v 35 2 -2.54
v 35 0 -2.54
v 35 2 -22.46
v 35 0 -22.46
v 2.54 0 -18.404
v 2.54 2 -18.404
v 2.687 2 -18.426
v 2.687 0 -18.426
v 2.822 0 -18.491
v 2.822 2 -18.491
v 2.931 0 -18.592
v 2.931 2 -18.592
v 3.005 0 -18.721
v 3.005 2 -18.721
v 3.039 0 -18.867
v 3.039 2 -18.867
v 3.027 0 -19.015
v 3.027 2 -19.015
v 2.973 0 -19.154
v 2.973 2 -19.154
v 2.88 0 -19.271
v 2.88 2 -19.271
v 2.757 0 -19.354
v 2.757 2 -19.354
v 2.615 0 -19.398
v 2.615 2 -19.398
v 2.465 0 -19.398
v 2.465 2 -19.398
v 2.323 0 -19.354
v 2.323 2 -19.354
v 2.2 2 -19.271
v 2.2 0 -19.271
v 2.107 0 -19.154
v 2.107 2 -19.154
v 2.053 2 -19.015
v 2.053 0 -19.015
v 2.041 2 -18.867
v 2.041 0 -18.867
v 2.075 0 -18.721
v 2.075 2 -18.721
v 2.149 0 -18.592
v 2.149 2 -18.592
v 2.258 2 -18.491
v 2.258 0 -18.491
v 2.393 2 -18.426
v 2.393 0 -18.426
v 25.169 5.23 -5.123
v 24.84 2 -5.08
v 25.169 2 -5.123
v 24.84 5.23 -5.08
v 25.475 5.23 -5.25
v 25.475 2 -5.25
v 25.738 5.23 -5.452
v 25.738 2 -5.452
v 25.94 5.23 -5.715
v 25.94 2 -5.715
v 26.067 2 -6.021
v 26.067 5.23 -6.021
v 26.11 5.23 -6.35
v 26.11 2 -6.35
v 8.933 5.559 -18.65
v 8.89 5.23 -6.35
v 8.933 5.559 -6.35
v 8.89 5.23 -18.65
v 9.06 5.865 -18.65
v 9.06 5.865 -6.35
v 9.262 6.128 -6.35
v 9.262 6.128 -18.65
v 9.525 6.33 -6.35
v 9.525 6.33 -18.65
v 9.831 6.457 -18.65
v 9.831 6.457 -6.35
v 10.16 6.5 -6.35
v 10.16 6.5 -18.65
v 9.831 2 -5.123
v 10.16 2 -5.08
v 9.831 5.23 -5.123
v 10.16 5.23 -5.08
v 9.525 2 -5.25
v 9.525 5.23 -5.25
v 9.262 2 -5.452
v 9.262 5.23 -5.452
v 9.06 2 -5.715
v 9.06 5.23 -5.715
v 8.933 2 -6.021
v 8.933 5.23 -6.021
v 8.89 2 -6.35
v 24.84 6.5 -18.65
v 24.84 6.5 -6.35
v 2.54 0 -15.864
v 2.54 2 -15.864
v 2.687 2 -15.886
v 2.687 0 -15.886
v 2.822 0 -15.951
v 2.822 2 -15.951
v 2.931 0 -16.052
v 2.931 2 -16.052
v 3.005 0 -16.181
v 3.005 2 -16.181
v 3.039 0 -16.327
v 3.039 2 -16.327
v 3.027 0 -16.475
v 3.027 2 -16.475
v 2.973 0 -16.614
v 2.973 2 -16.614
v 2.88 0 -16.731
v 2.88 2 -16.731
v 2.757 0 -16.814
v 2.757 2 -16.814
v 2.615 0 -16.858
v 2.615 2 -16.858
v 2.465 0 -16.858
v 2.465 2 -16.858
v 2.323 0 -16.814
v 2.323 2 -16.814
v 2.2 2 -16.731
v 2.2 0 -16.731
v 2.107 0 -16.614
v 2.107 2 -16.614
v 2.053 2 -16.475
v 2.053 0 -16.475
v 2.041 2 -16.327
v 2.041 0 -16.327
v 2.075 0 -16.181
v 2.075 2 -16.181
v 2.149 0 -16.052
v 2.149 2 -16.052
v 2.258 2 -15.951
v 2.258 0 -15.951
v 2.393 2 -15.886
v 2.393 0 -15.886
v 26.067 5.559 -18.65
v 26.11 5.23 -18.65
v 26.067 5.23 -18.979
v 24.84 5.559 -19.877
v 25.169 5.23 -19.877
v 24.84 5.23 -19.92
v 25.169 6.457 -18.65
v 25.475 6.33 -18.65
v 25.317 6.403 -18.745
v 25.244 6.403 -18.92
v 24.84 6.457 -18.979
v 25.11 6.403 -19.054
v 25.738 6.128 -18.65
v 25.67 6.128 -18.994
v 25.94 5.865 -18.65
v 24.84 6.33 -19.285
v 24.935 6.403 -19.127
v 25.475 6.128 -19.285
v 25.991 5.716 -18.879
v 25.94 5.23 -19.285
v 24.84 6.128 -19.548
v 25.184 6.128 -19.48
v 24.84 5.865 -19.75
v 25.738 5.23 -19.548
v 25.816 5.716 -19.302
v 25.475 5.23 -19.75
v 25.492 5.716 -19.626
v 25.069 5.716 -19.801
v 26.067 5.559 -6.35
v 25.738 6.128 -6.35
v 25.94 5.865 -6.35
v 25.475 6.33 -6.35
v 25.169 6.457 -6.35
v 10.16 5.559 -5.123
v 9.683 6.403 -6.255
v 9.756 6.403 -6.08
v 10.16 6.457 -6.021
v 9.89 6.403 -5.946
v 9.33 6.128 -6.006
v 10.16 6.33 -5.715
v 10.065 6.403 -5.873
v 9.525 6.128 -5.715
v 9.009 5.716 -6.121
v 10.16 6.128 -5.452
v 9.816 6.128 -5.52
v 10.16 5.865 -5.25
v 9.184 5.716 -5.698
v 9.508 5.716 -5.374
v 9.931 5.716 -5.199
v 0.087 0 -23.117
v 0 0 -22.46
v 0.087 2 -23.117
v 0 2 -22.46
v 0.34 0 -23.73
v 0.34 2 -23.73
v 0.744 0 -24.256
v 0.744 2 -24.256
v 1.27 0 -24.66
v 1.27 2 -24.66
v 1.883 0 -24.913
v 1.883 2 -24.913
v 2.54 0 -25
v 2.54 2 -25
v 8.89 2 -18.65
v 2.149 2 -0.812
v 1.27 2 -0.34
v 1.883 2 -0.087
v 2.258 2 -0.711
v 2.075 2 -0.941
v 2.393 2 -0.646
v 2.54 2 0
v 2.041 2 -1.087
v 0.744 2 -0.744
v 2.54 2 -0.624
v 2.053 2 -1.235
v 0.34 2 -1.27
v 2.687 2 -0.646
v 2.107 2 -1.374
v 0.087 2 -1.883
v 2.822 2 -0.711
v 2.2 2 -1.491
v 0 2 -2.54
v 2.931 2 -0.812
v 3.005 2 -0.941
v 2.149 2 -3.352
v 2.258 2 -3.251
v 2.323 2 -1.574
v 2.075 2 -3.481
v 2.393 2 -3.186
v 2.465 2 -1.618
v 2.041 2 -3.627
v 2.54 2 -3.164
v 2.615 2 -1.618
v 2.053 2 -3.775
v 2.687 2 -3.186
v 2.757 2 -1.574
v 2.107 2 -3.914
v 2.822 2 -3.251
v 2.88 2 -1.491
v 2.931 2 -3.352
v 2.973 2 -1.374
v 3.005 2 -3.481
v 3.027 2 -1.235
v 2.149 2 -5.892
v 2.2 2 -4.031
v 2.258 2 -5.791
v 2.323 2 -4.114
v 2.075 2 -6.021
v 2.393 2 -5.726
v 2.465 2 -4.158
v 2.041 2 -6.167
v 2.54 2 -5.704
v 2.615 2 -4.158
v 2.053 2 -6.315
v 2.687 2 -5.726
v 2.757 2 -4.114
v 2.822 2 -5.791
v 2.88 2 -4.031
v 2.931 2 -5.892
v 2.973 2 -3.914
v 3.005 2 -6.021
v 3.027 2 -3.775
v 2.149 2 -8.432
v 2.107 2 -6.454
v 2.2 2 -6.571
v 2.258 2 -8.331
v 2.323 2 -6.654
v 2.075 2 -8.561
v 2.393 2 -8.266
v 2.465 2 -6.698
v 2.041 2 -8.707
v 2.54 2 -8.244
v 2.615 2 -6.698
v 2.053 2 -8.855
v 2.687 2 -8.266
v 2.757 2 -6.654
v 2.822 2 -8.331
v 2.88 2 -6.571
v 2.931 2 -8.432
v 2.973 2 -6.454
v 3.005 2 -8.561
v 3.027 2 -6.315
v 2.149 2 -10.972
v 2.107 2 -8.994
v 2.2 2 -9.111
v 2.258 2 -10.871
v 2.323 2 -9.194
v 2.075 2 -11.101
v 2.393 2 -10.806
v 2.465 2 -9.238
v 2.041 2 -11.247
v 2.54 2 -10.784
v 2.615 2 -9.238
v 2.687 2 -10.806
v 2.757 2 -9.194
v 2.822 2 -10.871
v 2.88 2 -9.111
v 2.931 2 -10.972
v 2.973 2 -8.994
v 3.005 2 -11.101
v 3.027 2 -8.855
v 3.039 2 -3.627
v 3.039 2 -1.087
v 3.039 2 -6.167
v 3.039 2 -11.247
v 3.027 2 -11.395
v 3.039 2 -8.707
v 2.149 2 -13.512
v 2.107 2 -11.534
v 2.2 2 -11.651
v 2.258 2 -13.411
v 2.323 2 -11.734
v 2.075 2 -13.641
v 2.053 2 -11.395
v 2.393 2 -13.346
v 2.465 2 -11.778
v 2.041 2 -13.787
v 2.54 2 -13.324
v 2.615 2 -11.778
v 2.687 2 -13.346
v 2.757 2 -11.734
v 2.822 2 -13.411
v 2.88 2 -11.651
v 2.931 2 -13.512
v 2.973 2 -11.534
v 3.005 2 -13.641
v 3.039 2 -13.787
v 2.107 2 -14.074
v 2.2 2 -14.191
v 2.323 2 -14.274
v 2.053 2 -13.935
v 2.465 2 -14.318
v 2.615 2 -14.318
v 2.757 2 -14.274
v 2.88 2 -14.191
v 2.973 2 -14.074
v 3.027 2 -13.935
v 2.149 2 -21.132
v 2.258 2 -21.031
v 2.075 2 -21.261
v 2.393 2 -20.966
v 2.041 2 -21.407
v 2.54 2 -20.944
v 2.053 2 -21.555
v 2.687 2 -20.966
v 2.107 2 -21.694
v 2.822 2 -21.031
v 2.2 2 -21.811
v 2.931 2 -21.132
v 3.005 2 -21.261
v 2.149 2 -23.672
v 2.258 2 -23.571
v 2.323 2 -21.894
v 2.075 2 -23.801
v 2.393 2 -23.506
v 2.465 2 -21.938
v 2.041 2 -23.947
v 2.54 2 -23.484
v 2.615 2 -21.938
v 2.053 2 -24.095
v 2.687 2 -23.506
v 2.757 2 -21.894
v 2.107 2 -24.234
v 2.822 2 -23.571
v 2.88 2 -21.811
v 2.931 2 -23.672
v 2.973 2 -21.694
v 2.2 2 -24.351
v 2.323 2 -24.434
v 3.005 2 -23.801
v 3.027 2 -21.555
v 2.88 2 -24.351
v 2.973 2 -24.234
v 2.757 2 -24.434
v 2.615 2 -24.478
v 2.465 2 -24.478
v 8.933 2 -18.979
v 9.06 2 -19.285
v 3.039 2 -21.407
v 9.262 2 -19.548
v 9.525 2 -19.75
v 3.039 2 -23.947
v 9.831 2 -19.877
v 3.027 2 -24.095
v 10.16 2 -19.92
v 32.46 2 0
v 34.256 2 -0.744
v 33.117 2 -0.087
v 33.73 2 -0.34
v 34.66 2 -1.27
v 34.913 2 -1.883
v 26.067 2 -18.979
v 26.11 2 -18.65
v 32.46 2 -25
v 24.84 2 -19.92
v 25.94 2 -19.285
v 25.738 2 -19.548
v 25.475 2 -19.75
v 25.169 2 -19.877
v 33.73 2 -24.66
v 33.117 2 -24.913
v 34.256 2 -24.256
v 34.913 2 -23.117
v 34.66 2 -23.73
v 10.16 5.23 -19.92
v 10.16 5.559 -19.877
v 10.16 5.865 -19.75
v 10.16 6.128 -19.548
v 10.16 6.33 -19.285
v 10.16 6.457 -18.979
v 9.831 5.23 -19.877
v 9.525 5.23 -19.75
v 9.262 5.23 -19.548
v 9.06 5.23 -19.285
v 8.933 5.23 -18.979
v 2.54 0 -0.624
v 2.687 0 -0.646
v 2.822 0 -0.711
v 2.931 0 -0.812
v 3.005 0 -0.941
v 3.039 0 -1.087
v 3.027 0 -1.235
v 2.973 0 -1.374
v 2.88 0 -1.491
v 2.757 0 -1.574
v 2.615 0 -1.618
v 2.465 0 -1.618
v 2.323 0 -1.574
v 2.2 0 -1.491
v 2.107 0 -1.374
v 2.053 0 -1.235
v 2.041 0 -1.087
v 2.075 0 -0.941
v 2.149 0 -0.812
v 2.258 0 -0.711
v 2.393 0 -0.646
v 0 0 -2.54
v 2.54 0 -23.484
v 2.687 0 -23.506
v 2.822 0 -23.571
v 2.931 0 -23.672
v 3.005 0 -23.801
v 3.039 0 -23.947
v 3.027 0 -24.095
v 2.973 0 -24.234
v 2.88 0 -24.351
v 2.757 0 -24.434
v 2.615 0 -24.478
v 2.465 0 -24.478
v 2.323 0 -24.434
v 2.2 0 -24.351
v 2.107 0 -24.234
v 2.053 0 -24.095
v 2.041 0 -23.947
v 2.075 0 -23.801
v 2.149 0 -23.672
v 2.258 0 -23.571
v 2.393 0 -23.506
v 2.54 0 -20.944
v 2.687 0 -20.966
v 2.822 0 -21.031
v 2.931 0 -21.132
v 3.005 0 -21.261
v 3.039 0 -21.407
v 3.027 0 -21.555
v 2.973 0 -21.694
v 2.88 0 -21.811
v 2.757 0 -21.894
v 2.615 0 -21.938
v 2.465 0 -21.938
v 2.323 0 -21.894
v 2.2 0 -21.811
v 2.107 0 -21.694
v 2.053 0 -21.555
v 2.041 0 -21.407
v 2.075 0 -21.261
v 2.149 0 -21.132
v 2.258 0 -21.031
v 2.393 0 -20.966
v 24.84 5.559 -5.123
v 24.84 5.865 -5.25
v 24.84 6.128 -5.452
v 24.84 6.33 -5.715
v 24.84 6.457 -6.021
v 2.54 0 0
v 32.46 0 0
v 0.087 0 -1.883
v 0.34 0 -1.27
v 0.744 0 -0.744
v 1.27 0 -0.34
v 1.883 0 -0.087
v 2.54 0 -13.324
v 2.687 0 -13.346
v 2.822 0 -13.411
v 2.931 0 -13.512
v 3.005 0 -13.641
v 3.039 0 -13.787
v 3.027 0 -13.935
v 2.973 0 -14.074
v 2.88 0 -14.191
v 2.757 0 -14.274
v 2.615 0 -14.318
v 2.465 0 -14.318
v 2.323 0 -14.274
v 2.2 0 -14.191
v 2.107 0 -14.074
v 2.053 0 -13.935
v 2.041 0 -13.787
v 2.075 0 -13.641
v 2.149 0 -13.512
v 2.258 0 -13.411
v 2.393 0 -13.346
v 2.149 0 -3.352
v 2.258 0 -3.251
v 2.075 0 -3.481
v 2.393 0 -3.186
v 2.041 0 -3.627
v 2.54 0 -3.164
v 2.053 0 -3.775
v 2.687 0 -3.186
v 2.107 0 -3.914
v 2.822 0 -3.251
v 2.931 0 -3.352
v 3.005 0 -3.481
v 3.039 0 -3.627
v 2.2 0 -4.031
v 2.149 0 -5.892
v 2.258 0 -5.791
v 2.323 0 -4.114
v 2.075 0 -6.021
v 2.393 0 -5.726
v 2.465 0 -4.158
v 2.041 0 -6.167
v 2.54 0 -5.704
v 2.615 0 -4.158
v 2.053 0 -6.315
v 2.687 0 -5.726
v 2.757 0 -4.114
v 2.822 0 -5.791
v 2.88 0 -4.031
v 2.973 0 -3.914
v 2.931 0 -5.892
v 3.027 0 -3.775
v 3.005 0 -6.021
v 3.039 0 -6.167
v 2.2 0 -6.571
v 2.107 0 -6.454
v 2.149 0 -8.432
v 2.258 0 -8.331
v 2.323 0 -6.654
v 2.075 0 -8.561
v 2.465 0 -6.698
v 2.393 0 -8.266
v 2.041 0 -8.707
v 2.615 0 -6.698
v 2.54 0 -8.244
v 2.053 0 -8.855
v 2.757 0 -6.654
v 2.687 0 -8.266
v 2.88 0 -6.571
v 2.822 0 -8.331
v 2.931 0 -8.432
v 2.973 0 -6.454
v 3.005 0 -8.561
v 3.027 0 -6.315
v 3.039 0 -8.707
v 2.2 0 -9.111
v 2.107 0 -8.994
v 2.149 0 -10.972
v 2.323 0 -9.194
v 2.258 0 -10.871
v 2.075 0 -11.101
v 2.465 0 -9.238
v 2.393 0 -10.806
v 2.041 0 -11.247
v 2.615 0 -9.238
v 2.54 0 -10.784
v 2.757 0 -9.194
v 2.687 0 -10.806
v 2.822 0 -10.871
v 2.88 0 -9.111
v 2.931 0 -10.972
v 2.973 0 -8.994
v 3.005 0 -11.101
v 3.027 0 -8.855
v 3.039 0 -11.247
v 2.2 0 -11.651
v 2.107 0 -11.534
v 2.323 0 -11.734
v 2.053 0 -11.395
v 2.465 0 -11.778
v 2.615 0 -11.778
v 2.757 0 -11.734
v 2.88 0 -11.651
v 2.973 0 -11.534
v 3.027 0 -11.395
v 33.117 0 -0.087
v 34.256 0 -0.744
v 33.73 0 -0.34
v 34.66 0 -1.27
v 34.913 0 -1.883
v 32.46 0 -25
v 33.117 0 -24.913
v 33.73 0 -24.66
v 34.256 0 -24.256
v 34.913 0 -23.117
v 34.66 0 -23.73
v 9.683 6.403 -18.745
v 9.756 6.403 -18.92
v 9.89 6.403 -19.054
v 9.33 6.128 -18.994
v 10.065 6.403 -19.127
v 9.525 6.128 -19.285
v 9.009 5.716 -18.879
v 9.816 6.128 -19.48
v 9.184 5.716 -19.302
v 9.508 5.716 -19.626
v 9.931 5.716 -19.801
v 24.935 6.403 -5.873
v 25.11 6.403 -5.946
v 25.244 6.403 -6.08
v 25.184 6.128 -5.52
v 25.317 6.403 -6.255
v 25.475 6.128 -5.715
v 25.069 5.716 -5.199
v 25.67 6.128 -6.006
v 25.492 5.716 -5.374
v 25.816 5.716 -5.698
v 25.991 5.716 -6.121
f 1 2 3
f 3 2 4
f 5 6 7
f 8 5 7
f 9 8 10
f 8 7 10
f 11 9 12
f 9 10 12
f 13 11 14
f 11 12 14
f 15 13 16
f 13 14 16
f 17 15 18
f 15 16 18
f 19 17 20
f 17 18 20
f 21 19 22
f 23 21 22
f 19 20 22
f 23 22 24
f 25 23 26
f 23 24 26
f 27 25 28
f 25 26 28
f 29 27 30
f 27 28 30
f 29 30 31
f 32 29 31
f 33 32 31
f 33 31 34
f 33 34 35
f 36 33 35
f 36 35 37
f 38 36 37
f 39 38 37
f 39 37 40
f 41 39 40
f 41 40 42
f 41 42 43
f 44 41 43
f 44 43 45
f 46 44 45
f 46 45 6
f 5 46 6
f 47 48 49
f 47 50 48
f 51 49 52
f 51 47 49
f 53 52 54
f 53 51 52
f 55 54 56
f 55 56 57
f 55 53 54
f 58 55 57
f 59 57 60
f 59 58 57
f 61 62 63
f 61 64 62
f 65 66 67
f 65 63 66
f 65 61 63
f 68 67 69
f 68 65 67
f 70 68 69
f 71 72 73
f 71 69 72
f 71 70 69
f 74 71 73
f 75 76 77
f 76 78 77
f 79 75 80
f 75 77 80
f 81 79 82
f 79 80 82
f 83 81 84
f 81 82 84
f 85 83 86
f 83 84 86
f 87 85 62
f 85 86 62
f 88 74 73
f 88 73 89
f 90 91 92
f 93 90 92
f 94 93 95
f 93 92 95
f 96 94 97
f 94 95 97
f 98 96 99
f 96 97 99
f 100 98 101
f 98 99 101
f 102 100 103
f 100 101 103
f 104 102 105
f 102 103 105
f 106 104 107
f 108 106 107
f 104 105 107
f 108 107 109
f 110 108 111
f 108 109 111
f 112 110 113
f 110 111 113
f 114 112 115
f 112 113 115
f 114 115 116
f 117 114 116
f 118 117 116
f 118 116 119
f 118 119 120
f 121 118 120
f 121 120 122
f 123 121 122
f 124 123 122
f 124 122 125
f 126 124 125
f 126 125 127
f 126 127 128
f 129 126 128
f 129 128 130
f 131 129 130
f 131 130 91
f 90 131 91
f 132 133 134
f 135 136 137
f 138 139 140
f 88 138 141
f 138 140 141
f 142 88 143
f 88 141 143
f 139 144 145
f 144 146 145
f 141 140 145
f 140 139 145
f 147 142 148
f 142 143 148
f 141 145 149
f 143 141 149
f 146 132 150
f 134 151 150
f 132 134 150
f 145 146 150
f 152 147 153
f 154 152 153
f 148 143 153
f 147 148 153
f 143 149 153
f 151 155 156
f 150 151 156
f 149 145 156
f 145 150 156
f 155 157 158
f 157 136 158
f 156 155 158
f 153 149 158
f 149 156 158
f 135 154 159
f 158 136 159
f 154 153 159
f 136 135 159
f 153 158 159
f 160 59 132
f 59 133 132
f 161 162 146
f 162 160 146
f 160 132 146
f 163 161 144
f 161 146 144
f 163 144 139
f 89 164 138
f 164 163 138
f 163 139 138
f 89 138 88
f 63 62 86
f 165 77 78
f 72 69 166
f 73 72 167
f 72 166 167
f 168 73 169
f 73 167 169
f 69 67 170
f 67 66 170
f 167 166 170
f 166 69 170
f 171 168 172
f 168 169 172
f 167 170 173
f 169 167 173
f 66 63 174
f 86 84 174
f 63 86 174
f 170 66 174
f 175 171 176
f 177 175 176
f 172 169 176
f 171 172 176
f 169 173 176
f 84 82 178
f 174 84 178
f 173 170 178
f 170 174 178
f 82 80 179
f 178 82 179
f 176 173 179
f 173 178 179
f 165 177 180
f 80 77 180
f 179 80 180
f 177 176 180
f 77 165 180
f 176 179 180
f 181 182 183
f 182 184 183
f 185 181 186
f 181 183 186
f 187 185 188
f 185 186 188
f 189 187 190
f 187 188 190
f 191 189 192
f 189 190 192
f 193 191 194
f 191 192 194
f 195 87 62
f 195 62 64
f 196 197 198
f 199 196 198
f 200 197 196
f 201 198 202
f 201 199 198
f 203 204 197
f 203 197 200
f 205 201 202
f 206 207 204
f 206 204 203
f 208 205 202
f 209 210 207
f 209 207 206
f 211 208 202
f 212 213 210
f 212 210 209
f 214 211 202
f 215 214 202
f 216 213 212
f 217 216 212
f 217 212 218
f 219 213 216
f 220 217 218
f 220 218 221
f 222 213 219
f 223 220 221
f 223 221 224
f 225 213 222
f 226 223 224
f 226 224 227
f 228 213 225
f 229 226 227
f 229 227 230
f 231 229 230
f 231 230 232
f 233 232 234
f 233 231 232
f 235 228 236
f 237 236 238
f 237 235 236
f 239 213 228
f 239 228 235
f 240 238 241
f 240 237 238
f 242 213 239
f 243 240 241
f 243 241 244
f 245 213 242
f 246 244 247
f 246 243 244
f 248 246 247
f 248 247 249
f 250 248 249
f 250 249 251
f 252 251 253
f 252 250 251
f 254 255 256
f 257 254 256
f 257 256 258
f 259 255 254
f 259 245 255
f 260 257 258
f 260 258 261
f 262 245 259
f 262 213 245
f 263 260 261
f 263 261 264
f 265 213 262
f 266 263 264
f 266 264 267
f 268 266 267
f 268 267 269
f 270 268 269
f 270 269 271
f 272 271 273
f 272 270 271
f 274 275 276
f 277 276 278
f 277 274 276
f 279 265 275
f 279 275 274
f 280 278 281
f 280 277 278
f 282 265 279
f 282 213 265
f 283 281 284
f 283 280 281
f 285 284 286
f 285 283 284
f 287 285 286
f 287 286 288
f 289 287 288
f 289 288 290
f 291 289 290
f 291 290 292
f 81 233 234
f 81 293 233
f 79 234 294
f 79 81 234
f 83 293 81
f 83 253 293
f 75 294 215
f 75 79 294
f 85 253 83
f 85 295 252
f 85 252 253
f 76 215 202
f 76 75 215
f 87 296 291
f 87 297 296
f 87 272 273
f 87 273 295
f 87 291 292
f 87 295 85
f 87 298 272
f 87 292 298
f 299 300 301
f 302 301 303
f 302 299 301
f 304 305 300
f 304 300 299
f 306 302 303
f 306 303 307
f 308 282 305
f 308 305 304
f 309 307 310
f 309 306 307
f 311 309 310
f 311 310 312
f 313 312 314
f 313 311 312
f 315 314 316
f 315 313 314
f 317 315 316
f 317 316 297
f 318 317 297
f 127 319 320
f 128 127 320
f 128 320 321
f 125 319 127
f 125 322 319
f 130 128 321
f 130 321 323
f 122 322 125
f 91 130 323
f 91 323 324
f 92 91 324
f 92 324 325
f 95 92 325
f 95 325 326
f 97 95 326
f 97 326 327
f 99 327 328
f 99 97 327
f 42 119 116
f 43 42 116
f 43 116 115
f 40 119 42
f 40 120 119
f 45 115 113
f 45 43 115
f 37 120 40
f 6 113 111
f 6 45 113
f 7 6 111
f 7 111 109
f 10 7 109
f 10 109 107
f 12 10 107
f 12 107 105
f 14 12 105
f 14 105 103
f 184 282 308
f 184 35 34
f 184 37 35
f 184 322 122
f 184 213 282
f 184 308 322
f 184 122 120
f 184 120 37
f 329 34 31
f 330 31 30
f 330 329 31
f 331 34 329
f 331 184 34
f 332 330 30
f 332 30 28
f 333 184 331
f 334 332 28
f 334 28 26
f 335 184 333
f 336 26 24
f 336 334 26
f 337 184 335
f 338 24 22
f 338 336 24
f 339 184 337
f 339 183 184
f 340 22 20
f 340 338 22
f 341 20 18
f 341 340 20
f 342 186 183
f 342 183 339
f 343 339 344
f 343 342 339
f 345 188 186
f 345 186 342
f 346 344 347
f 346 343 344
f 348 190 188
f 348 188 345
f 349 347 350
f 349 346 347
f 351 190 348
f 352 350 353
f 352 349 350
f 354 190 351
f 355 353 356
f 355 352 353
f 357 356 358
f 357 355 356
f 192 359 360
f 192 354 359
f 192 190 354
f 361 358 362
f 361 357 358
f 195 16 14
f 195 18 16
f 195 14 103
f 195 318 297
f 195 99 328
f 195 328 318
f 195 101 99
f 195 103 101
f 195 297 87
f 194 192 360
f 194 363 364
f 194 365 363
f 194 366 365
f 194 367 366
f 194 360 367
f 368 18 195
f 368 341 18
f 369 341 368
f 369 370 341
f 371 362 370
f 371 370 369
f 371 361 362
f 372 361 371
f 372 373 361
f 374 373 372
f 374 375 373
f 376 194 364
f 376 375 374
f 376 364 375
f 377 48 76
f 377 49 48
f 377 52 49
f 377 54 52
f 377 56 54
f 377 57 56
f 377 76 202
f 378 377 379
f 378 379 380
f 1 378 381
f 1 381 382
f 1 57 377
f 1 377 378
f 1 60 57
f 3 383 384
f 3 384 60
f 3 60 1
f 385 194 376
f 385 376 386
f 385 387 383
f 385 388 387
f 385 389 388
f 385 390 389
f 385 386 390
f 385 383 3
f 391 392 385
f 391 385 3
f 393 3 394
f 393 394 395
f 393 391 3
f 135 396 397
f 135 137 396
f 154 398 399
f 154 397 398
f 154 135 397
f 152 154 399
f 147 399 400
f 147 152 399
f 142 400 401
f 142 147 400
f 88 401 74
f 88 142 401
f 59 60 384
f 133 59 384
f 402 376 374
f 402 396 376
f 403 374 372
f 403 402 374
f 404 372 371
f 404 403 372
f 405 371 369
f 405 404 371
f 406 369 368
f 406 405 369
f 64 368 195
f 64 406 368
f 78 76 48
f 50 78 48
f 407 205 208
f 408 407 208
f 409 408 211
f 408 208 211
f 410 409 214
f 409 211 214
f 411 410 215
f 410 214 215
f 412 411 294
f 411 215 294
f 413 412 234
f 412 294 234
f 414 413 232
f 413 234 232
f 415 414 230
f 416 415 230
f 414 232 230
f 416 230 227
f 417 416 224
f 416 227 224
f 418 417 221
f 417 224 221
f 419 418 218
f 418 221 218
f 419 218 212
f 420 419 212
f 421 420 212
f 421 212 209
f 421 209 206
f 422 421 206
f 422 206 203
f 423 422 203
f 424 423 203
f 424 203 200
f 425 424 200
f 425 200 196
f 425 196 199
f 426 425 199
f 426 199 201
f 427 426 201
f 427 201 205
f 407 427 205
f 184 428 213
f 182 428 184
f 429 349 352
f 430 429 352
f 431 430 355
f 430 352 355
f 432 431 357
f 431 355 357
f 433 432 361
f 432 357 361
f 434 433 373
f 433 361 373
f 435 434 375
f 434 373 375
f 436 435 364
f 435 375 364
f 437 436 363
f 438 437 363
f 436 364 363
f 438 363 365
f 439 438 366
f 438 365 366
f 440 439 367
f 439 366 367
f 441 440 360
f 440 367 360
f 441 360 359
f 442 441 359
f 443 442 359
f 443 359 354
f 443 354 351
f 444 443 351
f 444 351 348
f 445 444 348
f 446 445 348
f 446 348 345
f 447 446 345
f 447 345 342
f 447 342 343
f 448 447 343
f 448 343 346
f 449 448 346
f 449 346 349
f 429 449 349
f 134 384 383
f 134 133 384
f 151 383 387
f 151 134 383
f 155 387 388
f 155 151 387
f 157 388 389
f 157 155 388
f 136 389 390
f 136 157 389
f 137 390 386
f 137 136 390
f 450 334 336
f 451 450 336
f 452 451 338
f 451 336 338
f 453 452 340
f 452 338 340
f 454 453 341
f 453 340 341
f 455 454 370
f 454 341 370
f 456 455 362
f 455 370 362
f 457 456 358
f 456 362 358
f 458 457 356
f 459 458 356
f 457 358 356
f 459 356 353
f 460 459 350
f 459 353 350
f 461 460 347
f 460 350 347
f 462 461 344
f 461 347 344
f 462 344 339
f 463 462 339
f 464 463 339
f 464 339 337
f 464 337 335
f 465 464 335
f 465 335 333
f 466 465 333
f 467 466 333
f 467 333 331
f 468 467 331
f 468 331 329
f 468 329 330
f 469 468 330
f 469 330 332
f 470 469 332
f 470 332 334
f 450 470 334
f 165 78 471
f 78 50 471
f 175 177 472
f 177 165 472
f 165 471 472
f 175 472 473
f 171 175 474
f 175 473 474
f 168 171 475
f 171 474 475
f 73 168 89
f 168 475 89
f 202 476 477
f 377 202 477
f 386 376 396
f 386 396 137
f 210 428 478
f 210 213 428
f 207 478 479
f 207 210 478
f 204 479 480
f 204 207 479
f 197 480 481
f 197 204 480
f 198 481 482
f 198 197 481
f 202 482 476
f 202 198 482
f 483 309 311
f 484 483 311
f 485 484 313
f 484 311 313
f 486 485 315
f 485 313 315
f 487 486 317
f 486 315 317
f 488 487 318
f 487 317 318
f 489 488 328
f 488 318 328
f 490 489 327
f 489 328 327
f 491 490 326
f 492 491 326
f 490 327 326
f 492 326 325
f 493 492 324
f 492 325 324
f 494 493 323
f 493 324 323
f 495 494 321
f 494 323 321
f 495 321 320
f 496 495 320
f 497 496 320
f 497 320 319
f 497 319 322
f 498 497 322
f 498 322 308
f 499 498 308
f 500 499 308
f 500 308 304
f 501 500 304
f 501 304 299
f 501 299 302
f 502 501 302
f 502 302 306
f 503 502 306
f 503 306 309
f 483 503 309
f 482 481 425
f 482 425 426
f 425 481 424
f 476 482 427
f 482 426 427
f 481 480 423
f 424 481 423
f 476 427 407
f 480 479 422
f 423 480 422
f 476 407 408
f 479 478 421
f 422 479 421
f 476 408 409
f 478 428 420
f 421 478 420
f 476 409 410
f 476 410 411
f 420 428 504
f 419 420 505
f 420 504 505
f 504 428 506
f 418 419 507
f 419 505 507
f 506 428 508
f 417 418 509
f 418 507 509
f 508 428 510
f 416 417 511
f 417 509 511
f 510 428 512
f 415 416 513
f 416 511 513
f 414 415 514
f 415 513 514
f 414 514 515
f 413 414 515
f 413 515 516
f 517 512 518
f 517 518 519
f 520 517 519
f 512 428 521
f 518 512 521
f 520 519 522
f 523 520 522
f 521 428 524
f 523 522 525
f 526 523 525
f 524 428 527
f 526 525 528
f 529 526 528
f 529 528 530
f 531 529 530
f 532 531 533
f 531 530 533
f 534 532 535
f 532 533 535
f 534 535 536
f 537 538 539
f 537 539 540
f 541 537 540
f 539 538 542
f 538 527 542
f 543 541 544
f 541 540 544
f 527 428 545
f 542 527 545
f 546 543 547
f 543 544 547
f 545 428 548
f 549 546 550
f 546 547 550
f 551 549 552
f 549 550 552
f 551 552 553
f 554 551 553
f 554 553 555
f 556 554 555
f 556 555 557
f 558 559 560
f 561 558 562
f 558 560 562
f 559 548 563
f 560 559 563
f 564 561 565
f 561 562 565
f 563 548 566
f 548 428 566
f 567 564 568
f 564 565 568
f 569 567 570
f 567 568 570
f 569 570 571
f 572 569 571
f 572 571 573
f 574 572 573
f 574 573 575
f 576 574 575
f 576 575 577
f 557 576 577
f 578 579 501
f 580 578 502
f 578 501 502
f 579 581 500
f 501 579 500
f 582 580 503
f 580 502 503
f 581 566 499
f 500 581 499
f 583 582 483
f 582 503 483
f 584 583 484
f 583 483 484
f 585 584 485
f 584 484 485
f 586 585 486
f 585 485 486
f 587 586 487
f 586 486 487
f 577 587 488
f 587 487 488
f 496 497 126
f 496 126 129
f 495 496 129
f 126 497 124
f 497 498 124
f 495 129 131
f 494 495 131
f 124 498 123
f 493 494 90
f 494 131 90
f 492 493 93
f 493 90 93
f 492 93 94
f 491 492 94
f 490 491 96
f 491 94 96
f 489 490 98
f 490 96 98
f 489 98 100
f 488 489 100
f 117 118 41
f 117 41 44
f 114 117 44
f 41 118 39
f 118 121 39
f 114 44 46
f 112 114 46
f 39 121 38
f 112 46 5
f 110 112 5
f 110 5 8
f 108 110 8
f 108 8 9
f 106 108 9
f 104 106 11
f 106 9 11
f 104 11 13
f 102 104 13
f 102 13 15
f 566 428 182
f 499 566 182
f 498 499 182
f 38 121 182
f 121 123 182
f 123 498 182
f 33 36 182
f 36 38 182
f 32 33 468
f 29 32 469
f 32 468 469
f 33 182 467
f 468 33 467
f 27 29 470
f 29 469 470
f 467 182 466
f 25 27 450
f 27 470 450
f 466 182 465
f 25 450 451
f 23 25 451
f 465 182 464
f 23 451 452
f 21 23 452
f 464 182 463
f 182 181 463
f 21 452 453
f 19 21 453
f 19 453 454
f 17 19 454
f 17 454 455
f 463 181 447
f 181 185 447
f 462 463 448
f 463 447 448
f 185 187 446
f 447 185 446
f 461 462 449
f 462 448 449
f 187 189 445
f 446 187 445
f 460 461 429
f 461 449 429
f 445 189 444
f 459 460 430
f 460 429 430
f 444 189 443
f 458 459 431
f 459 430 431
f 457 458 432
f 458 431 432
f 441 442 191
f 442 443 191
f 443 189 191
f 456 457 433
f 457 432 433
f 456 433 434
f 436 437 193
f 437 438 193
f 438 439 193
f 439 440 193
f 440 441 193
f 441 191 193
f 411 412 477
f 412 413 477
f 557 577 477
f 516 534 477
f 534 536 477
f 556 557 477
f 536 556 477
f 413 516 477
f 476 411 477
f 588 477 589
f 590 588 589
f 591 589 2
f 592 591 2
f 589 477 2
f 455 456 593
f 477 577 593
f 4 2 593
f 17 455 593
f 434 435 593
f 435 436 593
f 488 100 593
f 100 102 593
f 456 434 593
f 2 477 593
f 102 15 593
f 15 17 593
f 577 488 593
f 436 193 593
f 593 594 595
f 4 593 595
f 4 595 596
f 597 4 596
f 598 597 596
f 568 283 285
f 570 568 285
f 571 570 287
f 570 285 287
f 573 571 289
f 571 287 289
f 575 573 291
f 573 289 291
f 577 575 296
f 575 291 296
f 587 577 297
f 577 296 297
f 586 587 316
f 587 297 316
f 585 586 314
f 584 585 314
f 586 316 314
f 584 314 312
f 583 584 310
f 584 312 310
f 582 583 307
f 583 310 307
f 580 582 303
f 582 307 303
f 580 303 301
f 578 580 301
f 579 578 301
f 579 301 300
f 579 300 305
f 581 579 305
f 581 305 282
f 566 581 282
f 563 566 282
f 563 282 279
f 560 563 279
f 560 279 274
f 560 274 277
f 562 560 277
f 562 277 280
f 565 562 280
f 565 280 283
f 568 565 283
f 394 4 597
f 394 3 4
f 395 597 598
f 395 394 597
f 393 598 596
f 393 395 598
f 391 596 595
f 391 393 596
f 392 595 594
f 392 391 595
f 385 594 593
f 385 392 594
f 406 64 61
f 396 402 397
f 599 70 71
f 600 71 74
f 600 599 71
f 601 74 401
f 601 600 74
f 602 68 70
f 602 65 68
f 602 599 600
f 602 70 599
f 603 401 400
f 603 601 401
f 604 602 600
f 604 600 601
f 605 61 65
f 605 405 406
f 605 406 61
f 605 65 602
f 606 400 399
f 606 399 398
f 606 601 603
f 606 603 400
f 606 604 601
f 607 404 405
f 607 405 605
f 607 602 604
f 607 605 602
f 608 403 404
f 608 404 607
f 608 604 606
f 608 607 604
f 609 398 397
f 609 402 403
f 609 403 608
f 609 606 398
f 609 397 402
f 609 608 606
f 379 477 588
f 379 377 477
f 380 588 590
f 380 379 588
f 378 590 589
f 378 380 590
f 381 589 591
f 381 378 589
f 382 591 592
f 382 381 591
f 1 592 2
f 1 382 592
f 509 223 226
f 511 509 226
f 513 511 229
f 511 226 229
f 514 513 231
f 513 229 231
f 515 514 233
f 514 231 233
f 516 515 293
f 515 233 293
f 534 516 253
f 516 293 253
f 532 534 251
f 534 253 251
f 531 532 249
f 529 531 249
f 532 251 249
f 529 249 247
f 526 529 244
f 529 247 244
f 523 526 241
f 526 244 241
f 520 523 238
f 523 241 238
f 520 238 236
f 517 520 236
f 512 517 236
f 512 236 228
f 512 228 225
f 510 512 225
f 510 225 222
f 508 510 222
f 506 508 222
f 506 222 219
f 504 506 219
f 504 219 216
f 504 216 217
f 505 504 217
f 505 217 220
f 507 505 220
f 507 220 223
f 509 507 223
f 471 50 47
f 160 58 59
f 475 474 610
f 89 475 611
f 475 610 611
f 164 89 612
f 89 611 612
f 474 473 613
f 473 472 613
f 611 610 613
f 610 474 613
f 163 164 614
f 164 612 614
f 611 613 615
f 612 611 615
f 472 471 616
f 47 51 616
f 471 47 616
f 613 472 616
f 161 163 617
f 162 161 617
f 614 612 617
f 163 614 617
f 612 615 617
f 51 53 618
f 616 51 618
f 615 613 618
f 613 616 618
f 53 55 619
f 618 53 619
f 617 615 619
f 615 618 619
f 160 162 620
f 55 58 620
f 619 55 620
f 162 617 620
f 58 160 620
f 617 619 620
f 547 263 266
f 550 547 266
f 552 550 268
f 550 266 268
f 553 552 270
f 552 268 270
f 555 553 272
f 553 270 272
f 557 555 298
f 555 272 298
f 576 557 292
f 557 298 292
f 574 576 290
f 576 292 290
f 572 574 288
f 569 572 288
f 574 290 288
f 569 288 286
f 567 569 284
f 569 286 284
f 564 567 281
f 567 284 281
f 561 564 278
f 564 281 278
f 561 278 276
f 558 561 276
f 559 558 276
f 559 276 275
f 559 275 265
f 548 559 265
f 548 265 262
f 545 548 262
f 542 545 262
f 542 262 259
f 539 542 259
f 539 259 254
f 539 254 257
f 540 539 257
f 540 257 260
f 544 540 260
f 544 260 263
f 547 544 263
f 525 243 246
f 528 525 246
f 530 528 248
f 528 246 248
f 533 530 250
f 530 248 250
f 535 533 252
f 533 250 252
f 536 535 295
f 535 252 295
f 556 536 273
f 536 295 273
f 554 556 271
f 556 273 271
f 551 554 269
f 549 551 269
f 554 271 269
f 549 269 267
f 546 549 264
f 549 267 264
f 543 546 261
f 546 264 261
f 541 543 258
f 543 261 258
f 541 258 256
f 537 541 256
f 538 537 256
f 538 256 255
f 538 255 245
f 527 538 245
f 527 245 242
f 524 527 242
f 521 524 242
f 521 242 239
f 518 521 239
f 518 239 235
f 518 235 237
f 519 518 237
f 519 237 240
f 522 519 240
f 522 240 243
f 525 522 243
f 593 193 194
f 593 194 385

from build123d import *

# Parameters (mm, degrees)
SKETCH1_W           = 35.000000104
SKETCH1_H           = 25
BOSS_EXTRUDE1_DEPTH = 2
FILLET1_R           = 2.54
SKETCH2_W           = 17.220000104
SKETCH2_H           = 14.84
BOSS_EXTRUDE2_DEPTH = 4.5
FILLET2_R           = 1.27
SKETCH3_R           = 0.5
CUT_EXTRUDE1_DEPTH  = 4.5


with BuildPart() as part:
    # Sketch1 → Boss-Extrude1 (new body)
    with BuildSketch(Plane(origin=(0, 0, 0), x_dir=(1, 0, 0), z_dir=(0, 1, 0))):
        with Locations((17.500000052, 12.5)):
            Rectangle(SKETCH1_W, SKETCH1_H)
    extrude(amount=BOSS_EXTRUDE1_DEPTH)

    # Fillet1
    fillet1_edges = [part.edges().sort_by_distance(p)[0] for p in [
        (0, 1, -25),
        (35.000000104, 1, -25),
        (35.000000104, 1, 0),
        (0, 1, 0),
    ]]
    fillet(fillet1_edges, radius=FILLET1_R)

    # Sketch2 → Boss-Extrude2 (add)
    with BuildSketch(Plane(origin=(0, 2, 0), x_dir=(1, 0, 0), z_dir=(0, 1, 0))):
        with Locations((17.500000052, 12.5)):
            Rectangle(SKETCH2_W, SKETCH2_H)
    extrude(amount=BOSS_EXTRUDE2_DEPTH)

    # Fillet2
    fillet2_edges = [part.edges().sort_by_distance(p)[0] for p in [
        (8.89, 4.25, -19.92),
        (8.89, 4.25, -5.08),
        (26.110000104, 4.25, -5.08),
        (26.110000104, 4.25, -19.92),
        (8.89, 6.5, -12.5),
        (17.500000052, 6.5, -5.08),
        (26.110000104, 6.5, -12.5),
        (17.500000052, 6.5, -19.92),
    ]]
    fillet(fillet2_edges, radius=FILLET2_R)

    # Sketch3 → Cut-Extrude1 (cut)
    with BuildSketch(Plane(origin=(0, 2, 0), x_dir=(1, 0, 0), z_dir=(0, 1, 0))):
        with Locations(Location((2.54, 23.984, 0), (0, 0, 270))):
            Circle(SKETCH3_R)
        with Locations(Location((2.54, 21.444, 0), (0, 0, 270))):
            Circle(SKETCH3_R)
        with Locations(Location((2.54, 18.904, 0), (0, 0, 270))):
            Circle(SKETCH3_R)
        with Locations(Location((2.54, 16.364, 0), (0, 0, 270))):
            Circle(SKETCH3_R)
        with Locations(Location((2.54, 13.824, 0), (0, 0, 270))):
            Circle(SKETCH3_R)
        with Locations(Location((2.54, 11.284, 0), (0, 0, 270))):
            Circle(SKETCH3_R)
        with Locations(Location((2.54, 8.744, 0), (0, 0, 270))):
            Circle(SKETCH3_R)
        with Locations(Location((2.54, 6.204, 0), (0, 0, 270))):
            Circle(SKETCH3_R)
        with Locations(Location((2.54, 3.664, 0), (0, 0, 270))):
            Circle(SKETCH3_R)
        with Locations(Location((2.54, 1.124, 0), (0, 0, 270))):
            Circle(SKETCH3_R)
    extrude(amount=-CUT_EXTRUDE1_DEPTH, mode=Mode.SUBTRACT)


solid = part.part
